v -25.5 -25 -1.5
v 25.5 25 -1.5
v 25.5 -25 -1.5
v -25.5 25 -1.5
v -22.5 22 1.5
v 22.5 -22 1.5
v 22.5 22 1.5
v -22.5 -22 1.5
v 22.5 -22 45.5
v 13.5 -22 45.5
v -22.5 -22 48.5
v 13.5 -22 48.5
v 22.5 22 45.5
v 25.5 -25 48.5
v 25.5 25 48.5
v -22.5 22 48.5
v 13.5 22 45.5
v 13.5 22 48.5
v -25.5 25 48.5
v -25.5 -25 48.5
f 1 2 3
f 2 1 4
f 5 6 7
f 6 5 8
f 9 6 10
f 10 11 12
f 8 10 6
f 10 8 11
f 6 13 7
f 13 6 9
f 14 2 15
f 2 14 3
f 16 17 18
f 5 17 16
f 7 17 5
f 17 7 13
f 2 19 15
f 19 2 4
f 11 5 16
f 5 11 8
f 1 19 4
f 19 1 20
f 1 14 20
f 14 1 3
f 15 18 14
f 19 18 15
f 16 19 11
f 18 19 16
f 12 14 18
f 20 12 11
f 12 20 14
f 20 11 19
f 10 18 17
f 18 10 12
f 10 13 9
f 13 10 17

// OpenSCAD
// file: standard.scad
// Gridfinity parameters
g_unit_plan = 42;
g_unit_height = 7;

// Maximum thickness were we could use the interior wall of the base plate
g_thickness_theshold = 3.95;

g_off_before_thickness = 2*2.15;
g_off_after_thickness = 2*2.85;

g_radius = 4;

g_connector_piece_box_length=5;
g_connector_piece_feet_length=10;
// main file
include <utility.scad>
include <standard.scad>


// ===== PARAMETERS ===== //

/* [Setup Parameters] */
$fa = 8;
$fs = 0.25;

/* [General Settings] */
// length of the box
length = 51.0;
// width of the box
width = 50.0;
// Height of the box
height = 50.0;
// material thickness
thickness = 3;
// length of a notch
length_notch = 10;

/* [Specific Settings] */
// Avoid tabs < thickness
remove_small_notch=true;

// Add a part to have a label on
label_type = 1; // [0: No label, 1: Flat, 2: buried]
// Label size
label_length=12;

/* [Gridfinity Settings] */
//Use gridfinity principle. Half unit are possible
is_gridfinity=false;

// number of bases along x-axis
gridx = 2; // .5
// number of bases along y-axis
gridy = 2; // .5
// number of bases along z-axis
gridz = 5;
// Is half unit to be used
force_half_unit=false;
// Type of attachement for the feet
bottom_type = 0; // [0: Flat, 1: T-connector]


/* [Manufacturing Settings] */
// Arrange the parts for lasercutting
output_plan=false;
// offset between the parts
offset_laser_part=1;



// ===== IMPLEMENTATION ===== //

// Dimensions
l = is_gridfinity ? gridx * g_unit_plan: length;
w = is_gridfinity ? gridy * g_unit_plan: width;
h = is_gridfinity ? gridz * g_unit_height - thickness: height;

l_notch = remove_small_notch && length_notch < thickness ? thickness : length_notch;

// Is it half unit or not
g_is_half_unit = force_half_unit || (gridx * 10) % 10 == 5 ||  (gridy * 10) % 10 == 5;

// Unit used
g_used_unit = g_is_half_unit ? g_unit_plan /2 : g_unit_plan;
// Number of elements
g_nx = g_is_half_unit ? 2 * gridx : gridx;
g_ny = g_is_half_unit ? 2 * gridy : gridy;

use_label_top = label_type != 0;
label_offset = label_type == 1 ? 0 : thickness;
no_off_th = label_offset > 1e-4;

// For Z we need to add locator elements
// For simple glued system, should we suggest to add a jig (Laser, cut) ?
// Improve arrangement plan ?
// Check 4mm thickness

if(output_plan){
  if(is_gridfinity){
    g_plan();
  } else {
    plan();
  }

} else {
  if(is_gridfinity){
    g_box();
  } else {
    box();
  }
}
